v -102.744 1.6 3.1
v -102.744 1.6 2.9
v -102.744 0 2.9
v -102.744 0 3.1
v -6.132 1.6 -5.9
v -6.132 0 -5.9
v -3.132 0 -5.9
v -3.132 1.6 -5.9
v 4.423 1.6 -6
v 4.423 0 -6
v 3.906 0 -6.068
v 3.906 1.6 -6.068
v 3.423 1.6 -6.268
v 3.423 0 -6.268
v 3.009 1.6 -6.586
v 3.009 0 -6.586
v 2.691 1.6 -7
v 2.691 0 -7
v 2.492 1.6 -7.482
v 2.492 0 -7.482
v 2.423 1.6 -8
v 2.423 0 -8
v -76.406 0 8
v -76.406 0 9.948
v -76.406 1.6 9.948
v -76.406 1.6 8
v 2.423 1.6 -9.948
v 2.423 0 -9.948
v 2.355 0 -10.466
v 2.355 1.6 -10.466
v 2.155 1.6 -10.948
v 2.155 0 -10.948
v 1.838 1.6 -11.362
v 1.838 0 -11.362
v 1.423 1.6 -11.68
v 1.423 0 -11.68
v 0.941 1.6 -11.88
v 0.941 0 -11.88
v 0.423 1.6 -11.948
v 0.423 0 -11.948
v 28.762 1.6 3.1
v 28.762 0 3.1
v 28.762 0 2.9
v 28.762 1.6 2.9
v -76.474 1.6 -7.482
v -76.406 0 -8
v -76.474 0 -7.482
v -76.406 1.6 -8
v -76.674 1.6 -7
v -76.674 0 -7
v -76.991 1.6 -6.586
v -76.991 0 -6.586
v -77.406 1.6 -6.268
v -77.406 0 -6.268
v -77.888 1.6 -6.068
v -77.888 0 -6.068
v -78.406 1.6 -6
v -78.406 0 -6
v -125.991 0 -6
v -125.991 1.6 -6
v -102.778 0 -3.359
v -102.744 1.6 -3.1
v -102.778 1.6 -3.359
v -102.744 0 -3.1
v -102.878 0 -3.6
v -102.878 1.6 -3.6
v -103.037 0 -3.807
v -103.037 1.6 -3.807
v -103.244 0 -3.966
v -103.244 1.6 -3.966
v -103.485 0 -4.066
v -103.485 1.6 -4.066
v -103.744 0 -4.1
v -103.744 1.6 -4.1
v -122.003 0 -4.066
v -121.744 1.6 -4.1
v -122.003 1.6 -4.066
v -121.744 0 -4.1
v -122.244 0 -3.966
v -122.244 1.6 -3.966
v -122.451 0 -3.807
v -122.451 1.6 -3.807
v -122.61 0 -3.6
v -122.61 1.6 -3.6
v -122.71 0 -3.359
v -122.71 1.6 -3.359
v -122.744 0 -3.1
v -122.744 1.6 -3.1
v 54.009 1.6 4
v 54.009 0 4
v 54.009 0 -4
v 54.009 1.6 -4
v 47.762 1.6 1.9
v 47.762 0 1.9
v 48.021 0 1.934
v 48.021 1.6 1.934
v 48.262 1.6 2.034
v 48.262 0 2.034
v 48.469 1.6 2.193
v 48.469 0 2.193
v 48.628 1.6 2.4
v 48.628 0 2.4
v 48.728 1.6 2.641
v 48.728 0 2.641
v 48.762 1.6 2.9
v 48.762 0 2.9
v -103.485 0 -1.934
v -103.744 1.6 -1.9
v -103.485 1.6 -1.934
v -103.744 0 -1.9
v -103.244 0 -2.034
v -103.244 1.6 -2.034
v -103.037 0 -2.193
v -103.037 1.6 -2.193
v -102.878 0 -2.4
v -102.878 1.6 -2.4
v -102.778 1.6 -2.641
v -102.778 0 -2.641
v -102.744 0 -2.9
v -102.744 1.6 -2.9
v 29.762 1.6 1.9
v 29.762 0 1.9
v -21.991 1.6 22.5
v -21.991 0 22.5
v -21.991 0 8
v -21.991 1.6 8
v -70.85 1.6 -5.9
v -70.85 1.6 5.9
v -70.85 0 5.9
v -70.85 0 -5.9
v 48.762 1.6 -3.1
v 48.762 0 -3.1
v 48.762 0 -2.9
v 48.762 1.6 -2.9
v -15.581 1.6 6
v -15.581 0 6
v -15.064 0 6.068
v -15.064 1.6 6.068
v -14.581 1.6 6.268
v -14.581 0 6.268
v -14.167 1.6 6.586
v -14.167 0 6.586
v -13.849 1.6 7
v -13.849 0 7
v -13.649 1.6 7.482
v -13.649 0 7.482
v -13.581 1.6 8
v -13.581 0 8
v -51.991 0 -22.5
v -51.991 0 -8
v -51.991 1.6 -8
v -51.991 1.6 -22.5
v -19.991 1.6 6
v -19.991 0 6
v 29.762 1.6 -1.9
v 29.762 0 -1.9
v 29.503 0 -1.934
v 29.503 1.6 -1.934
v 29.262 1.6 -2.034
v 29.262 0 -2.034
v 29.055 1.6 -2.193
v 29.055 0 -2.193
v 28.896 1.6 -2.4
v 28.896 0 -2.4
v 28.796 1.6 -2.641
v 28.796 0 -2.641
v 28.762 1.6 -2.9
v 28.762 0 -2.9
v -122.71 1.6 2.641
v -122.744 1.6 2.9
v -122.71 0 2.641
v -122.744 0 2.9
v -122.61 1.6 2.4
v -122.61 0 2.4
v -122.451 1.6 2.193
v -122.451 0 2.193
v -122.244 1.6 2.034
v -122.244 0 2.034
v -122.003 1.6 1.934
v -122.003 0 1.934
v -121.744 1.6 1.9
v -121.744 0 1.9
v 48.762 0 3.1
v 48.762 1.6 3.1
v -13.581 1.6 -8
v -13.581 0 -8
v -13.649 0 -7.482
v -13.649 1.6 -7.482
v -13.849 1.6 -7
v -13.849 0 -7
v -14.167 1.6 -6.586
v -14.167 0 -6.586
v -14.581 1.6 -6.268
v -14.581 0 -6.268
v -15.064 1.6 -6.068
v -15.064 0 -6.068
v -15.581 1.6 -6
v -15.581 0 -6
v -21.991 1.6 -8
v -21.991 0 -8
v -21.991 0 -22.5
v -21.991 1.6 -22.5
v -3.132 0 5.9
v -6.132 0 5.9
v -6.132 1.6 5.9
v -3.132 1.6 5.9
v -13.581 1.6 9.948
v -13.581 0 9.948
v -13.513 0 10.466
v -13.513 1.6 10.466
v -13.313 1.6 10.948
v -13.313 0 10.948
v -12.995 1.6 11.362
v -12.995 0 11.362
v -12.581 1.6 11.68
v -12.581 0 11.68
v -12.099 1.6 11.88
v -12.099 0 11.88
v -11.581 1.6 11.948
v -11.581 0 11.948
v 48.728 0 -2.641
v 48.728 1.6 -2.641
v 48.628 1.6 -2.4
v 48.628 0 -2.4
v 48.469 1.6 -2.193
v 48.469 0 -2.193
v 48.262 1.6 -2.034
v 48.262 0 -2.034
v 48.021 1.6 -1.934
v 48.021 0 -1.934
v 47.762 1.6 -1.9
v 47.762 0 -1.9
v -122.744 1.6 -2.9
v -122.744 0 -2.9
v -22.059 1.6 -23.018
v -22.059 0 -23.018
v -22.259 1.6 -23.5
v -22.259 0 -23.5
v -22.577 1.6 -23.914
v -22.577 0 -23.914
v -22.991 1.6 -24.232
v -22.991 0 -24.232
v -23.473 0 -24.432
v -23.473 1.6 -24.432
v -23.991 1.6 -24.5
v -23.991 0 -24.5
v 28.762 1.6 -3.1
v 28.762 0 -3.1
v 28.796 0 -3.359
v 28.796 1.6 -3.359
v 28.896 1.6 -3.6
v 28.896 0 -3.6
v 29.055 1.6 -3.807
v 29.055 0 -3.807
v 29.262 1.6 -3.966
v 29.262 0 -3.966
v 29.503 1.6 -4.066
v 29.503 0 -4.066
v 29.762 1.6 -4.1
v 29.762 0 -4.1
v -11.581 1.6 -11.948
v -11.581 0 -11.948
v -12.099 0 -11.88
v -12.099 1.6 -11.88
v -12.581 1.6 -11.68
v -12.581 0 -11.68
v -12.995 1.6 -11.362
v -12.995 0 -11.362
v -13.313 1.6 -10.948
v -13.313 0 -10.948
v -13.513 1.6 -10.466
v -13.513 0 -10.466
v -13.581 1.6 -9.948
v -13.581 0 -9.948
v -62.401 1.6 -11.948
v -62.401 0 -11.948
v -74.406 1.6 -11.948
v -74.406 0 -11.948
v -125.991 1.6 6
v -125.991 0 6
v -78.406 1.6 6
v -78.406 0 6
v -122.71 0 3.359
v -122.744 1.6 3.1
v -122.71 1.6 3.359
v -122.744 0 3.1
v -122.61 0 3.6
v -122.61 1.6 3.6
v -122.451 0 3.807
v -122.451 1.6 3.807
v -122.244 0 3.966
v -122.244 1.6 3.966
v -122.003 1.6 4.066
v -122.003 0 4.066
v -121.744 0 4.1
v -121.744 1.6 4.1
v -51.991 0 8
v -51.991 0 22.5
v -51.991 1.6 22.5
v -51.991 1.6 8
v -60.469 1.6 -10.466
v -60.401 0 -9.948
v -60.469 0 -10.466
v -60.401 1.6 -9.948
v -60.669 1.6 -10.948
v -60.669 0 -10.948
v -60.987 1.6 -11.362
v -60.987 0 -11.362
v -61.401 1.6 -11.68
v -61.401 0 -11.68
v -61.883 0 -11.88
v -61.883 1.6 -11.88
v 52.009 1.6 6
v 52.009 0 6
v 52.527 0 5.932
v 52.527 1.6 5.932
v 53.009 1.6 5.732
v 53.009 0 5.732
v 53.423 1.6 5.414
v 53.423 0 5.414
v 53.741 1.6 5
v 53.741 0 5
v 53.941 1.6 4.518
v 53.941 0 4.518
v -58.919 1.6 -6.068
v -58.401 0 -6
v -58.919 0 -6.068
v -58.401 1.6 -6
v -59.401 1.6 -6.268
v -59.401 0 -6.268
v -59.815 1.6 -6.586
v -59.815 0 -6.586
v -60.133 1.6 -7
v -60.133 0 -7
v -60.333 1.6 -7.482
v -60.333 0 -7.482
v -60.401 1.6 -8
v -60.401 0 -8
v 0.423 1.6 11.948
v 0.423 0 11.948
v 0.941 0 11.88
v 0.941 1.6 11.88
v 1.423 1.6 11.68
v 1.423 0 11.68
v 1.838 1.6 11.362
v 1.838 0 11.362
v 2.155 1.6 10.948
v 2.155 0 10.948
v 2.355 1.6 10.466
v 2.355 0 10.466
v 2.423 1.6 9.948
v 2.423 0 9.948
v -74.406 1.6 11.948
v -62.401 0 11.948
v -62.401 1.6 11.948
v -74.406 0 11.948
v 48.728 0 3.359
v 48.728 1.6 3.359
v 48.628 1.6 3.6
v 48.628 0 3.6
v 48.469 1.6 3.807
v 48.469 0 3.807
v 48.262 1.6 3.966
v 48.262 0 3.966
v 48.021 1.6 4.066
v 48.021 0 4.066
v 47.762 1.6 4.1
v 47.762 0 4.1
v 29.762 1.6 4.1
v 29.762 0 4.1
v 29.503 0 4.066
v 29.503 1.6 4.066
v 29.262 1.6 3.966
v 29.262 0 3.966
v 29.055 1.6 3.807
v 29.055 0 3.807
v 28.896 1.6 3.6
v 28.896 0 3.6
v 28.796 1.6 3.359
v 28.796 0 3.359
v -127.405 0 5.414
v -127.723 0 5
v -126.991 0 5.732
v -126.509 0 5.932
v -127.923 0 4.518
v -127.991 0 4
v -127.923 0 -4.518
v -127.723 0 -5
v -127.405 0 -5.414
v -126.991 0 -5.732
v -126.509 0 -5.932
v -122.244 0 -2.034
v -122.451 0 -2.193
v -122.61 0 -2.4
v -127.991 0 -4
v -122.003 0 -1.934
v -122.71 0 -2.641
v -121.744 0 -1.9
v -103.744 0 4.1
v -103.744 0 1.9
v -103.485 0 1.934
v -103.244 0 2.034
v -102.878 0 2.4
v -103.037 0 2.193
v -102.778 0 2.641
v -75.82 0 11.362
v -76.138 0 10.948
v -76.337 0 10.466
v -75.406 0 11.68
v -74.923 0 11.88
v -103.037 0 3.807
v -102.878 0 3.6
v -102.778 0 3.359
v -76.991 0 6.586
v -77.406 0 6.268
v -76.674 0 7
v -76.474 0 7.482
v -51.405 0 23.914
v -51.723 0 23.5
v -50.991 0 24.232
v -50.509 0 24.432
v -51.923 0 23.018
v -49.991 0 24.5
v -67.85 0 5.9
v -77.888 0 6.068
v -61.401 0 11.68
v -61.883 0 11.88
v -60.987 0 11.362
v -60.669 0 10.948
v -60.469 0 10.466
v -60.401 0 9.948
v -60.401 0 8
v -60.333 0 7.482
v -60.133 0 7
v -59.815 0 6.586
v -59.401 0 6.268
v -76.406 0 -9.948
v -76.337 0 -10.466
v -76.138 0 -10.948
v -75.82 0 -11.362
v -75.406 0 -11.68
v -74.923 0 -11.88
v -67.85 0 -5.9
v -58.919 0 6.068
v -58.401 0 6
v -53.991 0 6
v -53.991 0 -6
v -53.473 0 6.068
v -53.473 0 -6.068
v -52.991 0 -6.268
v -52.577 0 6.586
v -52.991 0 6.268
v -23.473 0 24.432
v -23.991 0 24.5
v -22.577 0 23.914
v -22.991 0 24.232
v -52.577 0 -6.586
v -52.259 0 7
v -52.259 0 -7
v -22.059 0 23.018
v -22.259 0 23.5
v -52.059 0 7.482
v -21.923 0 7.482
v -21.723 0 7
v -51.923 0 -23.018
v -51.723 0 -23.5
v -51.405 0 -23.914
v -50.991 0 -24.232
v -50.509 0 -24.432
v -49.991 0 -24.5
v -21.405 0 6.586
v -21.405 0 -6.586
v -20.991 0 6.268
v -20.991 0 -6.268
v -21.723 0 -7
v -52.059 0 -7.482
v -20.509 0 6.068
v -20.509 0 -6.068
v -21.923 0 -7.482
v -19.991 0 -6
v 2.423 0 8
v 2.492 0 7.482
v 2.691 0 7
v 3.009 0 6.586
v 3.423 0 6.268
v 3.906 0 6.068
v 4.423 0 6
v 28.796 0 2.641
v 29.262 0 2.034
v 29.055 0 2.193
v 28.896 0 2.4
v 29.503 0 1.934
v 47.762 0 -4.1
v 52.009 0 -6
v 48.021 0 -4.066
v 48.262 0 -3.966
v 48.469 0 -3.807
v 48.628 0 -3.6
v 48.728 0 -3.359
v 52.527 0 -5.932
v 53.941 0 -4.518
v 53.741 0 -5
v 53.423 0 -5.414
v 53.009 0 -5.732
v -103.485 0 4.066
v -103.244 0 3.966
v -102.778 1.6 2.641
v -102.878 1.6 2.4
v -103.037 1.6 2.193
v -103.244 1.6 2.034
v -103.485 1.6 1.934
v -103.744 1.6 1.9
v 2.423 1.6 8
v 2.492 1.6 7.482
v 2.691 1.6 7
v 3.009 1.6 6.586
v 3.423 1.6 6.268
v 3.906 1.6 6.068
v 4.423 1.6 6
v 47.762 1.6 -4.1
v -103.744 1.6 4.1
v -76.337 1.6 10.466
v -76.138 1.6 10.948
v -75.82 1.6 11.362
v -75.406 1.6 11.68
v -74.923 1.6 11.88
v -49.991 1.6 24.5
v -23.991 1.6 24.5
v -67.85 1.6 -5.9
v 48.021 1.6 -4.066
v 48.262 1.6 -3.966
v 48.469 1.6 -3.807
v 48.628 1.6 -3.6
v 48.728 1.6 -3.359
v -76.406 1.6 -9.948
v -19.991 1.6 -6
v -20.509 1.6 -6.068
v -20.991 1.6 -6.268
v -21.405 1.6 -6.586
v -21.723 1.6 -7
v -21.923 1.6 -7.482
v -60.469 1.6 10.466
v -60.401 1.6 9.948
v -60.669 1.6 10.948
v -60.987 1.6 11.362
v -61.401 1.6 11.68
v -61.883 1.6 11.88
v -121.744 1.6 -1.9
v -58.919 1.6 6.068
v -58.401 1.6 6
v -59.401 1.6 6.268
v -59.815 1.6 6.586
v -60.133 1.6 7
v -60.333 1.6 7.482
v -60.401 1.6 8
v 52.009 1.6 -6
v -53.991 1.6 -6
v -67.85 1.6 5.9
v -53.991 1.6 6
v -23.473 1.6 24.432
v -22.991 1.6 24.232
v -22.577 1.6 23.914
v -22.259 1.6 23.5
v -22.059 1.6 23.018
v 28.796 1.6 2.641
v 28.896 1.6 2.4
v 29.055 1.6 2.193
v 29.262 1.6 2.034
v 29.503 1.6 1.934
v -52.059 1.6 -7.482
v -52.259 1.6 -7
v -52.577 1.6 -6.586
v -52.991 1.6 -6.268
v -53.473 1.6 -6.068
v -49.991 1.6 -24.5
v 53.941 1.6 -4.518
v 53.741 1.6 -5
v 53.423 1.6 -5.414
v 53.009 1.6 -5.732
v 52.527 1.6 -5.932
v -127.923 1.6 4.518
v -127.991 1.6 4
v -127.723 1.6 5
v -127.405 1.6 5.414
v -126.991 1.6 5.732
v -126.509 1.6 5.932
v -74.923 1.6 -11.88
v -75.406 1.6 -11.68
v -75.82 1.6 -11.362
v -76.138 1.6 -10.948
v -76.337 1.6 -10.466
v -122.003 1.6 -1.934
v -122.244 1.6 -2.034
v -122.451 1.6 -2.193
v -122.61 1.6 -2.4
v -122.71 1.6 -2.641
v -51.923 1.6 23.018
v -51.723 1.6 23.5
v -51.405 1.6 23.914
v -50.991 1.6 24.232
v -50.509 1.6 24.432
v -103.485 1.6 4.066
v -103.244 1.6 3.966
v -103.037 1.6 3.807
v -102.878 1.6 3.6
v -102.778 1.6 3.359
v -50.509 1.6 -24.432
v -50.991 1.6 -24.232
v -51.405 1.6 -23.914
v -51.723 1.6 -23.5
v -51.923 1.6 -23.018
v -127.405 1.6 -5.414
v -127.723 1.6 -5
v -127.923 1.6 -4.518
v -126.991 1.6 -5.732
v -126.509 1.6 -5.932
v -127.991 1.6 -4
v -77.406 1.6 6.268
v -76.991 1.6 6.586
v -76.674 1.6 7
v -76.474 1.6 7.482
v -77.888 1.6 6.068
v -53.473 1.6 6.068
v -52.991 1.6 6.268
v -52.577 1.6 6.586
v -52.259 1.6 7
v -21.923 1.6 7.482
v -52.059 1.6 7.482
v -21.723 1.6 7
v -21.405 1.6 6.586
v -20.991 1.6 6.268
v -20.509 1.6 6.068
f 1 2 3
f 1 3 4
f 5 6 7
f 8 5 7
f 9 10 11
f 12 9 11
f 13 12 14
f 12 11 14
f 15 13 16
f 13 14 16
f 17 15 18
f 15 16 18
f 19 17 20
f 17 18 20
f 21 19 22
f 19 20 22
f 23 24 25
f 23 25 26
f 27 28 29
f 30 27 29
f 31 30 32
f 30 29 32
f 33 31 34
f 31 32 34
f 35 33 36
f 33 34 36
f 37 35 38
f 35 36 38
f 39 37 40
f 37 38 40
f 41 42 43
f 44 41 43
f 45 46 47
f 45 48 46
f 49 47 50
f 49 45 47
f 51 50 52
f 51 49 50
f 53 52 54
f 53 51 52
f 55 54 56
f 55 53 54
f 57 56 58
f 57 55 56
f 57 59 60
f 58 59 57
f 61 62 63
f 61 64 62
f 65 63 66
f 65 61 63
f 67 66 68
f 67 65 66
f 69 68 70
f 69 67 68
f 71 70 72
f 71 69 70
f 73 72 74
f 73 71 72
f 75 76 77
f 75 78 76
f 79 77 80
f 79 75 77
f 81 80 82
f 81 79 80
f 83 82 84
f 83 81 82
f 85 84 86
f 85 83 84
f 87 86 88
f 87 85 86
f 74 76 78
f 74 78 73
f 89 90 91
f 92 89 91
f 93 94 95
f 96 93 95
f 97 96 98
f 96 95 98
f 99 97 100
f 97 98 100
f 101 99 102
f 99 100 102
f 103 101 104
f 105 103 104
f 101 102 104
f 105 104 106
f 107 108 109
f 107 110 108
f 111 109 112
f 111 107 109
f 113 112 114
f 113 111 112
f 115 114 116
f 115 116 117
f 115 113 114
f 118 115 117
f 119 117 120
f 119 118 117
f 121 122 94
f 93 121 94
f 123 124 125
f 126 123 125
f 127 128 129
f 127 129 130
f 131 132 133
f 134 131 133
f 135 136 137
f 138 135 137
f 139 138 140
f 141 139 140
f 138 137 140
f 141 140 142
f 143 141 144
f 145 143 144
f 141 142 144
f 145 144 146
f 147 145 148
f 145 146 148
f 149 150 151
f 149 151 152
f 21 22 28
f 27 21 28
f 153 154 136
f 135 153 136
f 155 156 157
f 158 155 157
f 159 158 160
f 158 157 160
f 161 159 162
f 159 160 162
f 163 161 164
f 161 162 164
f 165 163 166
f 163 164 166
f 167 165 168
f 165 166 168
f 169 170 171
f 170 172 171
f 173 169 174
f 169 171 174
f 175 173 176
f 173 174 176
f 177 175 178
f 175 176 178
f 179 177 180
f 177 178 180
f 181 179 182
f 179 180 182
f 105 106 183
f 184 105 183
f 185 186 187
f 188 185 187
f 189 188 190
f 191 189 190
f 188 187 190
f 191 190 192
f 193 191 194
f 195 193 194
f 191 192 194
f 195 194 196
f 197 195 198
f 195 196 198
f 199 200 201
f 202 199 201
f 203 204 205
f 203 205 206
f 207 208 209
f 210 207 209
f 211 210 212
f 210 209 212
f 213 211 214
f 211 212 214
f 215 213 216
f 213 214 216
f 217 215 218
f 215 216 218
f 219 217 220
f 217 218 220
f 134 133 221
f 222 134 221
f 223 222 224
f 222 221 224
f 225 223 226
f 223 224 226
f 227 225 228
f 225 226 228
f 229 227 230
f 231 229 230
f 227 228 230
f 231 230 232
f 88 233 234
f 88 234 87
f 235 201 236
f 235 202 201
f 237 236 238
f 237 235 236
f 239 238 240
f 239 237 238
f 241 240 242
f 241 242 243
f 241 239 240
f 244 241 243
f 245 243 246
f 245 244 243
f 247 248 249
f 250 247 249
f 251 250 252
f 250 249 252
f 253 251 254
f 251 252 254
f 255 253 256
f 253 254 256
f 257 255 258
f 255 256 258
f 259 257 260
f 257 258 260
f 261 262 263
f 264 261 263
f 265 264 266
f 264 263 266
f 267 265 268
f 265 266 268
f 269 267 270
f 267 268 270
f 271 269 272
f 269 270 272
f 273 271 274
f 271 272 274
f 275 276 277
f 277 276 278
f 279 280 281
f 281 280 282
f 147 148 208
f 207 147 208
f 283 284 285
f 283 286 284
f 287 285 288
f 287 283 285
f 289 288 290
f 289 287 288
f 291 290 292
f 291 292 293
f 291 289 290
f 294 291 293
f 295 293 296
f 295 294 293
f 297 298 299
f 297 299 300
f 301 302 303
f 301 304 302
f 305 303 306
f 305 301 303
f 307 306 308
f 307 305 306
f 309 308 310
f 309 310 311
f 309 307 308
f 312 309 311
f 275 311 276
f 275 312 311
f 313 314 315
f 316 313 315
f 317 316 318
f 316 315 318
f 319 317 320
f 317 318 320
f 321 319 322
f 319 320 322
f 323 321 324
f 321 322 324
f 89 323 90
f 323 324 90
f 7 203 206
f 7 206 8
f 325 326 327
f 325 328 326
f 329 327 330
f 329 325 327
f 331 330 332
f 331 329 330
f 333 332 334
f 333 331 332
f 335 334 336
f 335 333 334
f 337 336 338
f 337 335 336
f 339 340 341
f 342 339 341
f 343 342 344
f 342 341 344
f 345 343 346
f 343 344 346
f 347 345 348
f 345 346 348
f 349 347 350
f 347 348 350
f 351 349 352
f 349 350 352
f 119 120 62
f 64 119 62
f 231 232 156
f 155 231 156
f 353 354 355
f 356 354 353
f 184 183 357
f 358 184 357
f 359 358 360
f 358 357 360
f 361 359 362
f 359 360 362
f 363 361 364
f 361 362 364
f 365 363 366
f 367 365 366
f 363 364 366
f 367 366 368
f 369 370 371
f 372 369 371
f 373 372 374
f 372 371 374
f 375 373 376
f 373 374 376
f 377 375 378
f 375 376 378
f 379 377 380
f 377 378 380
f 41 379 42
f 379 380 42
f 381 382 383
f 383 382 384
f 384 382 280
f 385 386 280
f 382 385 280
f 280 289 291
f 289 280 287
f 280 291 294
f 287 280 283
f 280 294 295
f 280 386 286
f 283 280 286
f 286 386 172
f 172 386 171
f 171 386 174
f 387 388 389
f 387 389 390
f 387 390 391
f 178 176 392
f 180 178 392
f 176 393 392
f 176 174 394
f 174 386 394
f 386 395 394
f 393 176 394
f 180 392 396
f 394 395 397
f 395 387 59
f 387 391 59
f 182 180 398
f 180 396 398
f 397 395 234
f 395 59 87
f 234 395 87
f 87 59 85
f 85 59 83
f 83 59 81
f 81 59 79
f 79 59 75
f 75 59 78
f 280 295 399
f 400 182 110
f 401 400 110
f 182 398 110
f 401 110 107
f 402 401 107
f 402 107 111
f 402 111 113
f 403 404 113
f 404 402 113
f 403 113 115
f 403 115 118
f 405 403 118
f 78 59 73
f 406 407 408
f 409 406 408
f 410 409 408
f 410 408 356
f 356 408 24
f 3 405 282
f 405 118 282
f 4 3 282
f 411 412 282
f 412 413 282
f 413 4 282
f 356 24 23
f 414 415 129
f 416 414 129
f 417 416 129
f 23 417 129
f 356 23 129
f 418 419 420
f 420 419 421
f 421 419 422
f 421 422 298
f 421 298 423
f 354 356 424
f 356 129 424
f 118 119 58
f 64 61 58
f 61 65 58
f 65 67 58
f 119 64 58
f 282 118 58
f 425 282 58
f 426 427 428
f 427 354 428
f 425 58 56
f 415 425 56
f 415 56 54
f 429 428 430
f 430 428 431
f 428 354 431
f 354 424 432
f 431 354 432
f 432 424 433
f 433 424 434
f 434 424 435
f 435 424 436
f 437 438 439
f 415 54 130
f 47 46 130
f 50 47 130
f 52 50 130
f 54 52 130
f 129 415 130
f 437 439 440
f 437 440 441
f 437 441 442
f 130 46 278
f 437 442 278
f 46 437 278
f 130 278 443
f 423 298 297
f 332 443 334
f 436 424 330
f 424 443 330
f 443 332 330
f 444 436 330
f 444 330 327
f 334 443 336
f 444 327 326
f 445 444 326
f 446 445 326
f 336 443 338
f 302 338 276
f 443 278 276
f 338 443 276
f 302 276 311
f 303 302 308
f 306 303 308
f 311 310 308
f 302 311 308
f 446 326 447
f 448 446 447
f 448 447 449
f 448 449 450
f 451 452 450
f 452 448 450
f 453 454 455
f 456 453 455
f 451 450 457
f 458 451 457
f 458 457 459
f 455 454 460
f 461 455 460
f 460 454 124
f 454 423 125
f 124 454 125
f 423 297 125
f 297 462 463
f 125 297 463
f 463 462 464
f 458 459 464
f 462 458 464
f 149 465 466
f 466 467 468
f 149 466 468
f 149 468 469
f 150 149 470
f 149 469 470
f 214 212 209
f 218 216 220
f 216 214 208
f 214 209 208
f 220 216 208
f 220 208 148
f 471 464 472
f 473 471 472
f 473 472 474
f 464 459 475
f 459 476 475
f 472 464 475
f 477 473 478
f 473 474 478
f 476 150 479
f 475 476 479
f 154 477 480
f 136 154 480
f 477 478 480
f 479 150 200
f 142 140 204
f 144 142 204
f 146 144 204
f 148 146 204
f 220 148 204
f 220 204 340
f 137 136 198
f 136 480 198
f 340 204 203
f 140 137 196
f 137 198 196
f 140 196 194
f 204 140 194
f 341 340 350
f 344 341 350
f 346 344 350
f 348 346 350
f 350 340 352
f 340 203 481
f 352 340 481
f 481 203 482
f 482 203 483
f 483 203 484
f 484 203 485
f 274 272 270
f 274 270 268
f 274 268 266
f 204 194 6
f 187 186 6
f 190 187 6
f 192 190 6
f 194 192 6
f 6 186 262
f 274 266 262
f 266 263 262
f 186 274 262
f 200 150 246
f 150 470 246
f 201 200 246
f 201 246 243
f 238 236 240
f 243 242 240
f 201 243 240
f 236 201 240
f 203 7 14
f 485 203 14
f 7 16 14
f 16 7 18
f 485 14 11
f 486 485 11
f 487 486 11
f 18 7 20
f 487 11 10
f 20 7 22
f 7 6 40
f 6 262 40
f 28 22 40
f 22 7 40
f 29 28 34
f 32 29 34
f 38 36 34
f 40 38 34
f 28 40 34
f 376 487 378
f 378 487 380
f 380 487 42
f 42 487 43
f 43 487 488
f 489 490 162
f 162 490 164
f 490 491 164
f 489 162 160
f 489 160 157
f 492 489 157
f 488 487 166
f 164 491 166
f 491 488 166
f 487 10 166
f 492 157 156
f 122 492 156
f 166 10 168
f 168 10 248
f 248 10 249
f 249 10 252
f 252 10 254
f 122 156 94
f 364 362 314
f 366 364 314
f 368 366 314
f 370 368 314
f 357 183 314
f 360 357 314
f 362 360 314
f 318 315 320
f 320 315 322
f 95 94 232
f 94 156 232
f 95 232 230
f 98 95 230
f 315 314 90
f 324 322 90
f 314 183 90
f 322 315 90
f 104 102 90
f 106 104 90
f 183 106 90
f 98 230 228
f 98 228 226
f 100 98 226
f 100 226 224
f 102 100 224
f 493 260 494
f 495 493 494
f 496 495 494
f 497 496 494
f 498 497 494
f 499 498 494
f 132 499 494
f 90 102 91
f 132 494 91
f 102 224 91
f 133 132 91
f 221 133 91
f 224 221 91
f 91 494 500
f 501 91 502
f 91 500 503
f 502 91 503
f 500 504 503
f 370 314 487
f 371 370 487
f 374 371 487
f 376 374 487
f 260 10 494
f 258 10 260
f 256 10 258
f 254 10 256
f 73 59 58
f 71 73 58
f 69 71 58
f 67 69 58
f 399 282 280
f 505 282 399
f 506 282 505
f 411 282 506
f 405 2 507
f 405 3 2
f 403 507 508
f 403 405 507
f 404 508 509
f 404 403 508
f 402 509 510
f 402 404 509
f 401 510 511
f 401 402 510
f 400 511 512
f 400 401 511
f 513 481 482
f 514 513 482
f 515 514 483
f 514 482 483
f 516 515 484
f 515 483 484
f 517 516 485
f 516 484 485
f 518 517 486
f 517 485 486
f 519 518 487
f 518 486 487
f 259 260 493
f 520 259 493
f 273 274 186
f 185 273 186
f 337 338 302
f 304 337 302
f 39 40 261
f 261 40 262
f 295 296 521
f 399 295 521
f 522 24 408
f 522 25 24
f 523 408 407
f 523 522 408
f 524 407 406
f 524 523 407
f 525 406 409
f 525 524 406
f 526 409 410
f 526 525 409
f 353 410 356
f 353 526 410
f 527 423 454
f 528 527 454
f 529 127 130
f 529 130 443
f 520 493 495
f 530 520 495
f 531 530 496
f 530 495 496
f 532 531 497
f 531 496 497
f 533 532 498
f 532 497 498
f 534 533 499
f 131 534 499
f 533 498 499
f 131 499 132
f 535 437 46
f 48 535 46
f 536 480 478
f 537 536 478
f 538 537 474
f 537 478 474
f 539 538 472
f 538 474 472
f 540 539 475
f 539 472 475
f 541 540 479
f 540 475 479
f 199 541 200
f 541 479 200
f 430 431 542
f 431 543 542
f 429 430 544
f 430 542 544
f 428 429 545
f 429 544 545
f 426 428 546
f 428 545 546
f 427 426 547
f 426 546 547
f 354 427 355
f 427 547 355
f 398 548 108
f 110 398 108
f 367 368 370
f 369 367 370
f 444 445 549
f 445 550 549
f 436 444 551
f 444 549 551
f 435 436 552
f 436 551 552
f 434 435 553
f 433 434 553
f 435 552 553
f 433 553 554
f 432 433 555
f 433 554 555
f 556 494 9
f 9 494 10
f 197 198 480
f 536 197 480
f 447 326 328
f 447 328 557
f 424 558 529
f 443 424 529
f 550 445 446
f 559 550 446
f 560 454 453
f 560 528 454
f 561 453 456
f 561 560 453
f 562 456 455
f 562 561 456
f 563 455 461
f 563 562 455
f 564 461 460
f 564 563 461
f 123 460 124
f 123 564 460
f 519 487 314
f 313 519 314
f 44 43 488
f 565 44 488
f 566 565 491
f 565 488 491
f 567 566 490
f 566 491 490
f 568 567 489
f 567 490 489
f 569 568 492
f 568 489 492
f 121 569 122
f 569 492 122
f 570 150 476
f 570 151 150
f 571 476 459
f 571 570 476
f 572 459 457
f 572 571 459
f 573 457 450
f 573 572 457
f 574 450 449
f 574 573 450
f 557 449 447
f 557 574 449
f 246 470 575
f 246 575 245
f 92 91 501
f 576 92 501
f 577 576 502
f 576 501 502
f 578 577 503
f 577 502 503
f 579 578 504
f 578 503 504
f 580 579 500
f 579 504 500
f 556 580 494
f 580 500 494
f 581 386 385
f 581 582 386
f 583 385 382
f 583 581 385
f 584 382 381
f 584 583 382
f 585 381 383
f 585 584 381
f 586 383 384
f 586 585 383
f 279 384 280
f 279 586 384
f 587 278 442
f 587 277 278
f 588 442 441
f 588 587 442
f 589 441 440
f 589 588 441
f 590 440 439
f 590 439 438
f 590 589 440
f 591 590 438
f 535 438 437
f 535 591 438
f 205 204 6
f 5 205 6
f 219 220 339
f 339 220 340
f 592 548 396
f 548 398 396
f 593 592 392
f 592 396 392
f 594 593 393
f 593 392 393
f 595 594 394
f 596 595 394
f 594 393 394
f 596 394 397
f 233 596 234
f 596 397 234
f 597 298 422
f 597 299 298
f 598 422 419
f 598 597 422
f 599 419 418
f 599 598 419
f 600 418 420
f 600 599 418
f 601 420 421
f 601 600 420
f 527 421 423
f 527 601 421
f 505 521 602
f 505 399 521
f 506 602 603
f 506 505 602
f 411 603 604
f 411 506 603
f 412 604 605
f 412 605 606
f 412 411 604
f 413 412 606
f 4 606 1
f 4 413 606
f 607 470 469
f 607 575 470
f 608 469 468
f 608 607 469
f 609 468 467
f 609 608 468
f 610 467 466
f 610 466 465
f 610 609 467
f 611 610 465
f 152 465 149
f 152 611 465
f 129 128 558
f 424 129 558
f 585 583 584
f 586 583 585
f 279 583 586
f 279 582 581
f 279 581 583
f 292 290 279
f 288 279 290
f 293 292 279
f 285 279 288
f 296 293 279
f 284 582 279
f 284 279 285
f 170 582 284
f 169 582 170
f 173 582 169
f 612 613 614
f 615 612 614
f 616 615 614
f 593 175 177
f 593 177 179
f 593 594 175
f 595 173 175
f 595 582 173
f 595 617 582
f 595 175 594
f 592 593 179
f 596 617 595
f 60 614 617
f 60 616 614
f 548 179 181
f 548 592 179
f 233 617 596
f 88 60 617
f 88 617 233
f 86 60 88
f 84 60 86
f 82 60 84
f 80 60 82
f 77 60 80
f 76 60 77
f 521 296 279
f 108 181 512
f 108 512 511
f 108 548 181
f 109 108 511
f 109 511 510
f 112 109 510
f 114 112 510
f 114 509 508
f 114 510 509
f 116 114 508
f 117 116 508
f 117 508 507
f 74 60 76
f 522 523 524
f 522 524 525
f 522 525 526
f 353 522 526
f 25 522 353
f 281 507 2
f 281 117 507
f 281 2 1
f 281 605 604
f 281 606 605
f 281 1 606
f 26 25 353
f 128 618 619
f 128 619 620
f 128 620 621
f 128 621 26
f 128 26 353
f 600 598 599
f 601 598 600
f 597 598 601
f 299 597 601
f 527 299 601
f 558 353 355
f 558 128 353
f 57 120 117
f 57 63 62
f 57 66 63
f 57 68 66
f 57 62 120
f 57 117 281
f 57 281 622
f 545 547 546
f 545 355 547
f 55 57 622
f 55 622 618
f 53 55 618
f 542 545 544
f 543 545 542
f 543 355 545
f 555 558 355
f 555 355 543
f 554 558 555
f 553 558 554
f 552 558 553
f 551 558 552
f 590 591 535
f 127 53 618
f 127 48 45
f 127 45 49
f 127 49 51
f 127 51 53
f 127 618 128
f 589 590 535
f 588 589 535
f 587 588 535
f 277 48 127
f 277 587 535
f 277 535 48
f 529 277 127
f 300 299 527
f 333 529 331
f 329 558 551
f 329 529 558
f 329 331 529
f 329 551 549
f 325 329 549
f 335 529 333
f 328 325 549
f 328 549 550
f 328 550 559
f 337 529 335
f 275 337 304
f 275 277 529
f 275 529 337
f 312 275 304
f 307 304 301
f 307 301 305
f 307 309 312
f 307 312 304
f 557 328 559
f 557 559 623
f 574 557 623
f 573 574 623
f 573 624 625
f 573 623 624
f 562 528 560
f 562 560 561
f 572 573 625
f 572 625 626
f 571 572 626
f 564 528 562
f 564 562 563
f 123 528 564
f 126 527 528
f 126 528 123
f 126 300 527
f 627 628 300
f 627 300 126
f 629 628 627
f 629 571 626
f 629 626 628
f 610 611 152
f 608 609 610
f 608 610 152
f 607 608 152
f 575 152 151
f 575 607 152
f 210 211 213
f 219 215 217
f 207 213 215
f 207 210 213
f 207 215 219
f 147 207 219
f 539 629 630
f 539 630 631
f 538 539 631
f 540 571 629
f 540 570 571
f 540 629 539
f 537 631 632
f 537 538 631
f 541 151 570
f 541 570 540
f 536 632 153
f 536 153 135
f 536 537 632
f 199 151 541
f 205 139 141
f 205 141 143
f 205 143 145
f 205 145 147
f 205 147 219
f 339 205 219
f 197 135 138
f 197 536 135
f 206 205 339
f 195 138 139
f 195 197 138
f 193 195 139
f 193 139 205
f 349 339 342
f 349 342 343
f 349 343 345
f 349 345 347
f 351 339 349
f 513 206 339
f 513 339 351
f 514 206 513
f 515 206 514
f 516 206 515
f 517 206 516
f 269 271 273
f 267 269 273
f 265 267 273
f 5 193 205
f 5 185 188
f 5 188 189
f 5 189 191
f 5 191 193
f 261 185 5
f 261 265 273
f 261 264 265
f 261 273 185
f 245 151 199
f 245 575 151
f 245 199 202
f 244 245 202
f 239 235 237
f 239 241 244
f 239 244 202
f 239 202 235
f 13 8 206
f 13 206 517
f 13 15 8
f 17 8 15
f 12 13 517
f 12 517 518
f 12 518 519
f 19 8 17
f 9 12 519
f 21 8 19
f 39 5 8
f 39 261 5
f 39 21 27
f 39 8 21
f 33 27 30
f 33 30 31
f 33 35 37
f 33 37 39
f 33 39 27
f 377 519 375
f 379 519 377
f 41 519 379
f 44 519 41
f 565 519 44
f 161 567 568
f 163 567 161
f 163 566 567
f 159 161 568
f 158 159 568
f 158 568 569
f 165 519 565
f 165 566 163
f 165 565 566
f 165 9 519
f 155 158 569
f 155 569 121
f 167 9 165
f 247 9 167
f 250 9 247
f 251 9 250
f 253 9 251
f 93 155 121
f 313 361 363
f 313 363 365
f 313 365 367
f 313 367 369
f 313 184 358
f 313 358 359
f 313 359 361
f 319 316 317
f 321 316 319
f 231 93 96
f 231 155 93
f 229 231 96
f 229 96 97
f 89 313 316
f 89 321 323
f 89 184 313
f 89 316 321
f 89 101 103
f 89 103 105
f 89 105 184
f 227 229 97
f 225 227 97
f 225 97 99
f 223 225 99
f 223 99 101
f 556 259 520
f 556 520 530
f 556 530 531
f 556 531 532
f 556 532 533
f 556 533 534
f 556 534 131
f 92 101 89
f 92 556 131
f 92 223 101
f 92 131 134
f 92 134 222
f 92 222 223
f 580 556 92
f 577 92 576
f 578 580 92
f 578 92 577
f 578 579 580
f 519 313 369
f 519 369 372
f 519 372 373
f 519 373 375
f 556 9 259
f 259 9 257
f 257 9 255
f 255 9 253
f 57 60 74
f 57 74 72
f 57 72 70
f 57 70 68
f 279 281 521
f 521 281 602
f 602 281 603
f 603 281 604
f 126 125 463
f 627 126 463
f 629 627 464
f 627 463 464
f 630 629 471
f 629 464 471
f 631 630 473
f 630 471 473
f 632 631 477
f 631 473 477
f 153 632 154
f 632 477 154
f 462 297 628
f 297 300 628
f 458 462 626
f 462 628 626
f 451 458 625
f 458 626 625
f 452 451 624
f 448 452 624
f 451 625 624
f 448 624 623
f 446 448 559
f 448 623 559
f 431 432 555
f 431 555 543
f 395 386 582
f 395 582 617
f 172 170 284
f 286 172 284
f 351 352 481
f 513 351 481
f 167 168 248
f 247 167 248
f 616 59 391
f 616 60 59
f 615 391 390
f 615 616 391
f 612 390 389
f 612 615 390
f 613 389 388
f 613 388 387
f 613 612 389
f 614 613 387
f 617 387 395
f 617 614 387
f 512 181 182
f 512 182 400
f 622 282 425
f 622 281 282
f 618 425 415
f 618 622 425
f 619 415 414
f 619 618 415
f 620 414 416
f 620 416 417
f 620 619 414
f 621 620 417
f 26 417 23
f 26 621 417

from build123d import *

# Parameters (mm, degrees)
SKETCH_11_W             = 70
SKETCH_11_H             = 12
EXTRUDE_6_DEPTH         = 1.6
SKETCH_12_W             = 3
SKETCH_12_H             = 11.8
CUT_EXTRUDE_6_DEPTH     = 1.6
SKETCH_13_W             = 20
SKETCH_13_H             = 2.2
CUT_EXTRUDE_7_DEPTH     = 1.6
FILLET_1_R              = 1
FILLET_1_OF_MIRROR_15_R = 1
EXTRUDE_7_DEPTH         = 1.6
SKETCH_16_W             = 6
SKETCH_16_H             = 12
EXTRUDE_9_DEPTH         = 1.6
SKETCH_18_W             = 30
SKETCH_18_H             = 49
EXTRUDE_12_DEPTH        = 1.6
FILLET_3_R              = 2
MIRROR_24_OUTLINE_W     = 3
MIRROR_24_OUTLINE_H     = 11.8
MIRROR_24_DEPTH         = 1.6
FILLET_4_R              = 2


# Read off the part's stored shape, not the designer's step: 镜向24
with BuildPart() as part:
    # 草图11 → 凸台-拉伸6 (new body)
    with BuildSketch(Plane(origin=(0, 0, 0), x_dir=(1, 0, 0), z_dir=(0, 1, 0))):
        with Locations((-92.991102456, 0)):
            Rectangle(SKETCH_11_W, SKETCH_11_H)
    extrude(amount=EXTRUDE_6_DEPTH)

    # 草图12 → 切除-拉伸6 (cut)
    with BuildSketch(Plane(origin=(0, 1.6, 0), x_dir=(1, 0, 0), z_dir=(0, 1, 0))):
        with Locations((-69.350034459, 0)):
            Rectangle(SKETCH_12_W, SKETCH_12_H)
    extrude(amount=-CUT_EXTRUDE_6_DEPTH, mode=Mode.SUBTRACT)

    # 草图13 → 切除-拉伸7 (cut)
    with BuildSketch(Plane(origin=(0, 1.6, 0), x_dir=(1, 0, 0), z_dir=(0, 1, 0))):
        with Locations((-112.744310304, 3)):
            Rectangle(SKETCH_13_W, SKETCH_13_H)
    cut_extrude_7 = extrude(amount=-CUT_EXTRUDE_7_DEPTH, mode=Mode.SUBTRACT)

    # 圆角1
    fillet_1_edges = [part.edges().sort_by_distance(p)[0] for p in [
        (-122.744310304, 0.8, -1.9),
        (-122.744310304, 0.8, -4.1),
        (-102.744310304, 0.8, -4.1),
        (-102.744310304, 0.8, -1.9),
    ]]
    fillet(fillet_1_edges, radius=FILLET_1_R)

    # 镜向15: 切除-拉伸7 across plane
    add(cut_extrude_7.mirror(Plane(origin=(0, 0, 0), x_dir=(1, 0, 0), z_dir=(0, 0, -1))), mode=Mode.SUBTRACT)

    # 圆角1 of 镜向15
    fillet_1_of_mirror_15_edges = [part.edges().sort_by_distance(p)[0] for p in [
        (-122.744310304, 0.8, 1.9),
        (-122.744310304, 0.8, 4.1),
        (-102.744310304, 0.8, 4.1),
        (-102.744310304, 0.8, 1.9),
    ]]
    fillet(fillet_1_of_mirror_15_edges, radius=FILLET_1_OF_MIRROR_15_R)

    # 草图14 → 凸台-拉伸7 (add)
    with BuildSketch(Plane(origin=(0, 0, 0), x_dir=(1, 0, 0), z_dir=(0, 1, 0))):
        Polygon((-60.400975616, 6), (-60.400975616, 11.948069584), (-62.610711949, 11.948069584), (-76.405563985, 11.948069584), (-76.405563985, 6), (-74.195827651, 6), (-62.609356584, 6), align=None)
    extrude_7 = extrude(amount=EXTRUDE_7_DEPTH)

    # 镜向17: 凸台-拉伸7 across plane
    add(extrude_7.mirror(Plane(origin=(0, 0, 0), x_dir=(1, 0, 0), z_dir=(0, 0, -1))))

    # 草图16 → 凸台-拉伸9 (add)
    with BuildSketch(Plane(origin=(0, 0, 0), x_dir=(1, 0, 0), z_dir=(0, 1, 0))):
        with Locations((-54.991102456, 0)):
            Rectangle(SKETCH_16_W, SKETCH_16_H)
    extrude(amount=EXTRUDE_9_DEPTH)

    # 草图18 → 凸台-拉伸12 (add)
    with BuildSketch(Plane(origin=(0, 0, 0), x_dir=(1, 0, 0), z_dir=(0, 1, 0))):
        with Locations((-36.991102456, 0)):
            Rectangle(SKETCH_18_W, SKETCH_18_H)
    extrude(amount=EXTRUDE_12_DEPTH)

    # 圆角3
    fillet_3_edges = [part.edges().sort_by_distance(p)[0] for p in [
        (-127.991102456, 0.8, 6),
        (-127.991102456, 0.8, -6),
        (-51.991102456, 0.8, -6),
        (-51.991102456, 0.8, 6),
        (-76.405563985, 0.8, 6),
        (-60.400975616, 0.8, 6),
        (-60.400975616, 0.8, -6),
        (-76.405563985, 0.8, -6),
        (-60.400975616, 0.8, 11.948069584),
        (-76.405563985, 0.8, 11.948069584),
        (-76.405563985, 0.8, -11.948069584),
        (-60.400975616, 0.8, -11.948069584),
    ]]
    fillet(fillet_3_edges, radius=FILLET_3_R)

    # 镜向24 outline → 镜向24 (add)
    with BuildSketch(Plane(origin=(0, 0, 0), x_dir=(1, 0, 0), z_dir=(0, 1, 0))):
        with BuildLine():
            Line((4.423359072, -6), (52.008897544, -6))
            ThreePointArc((52.008897544, -6), (53.423111106, -5.414213562), (54.008897544, -4))
            Line((54.008897544, -4), (54.008897544, 4))
            ThreePointArc((54.008897544, 4), (53.423111106, 5.414213562), (52.008897544, 6))
            Line((52.008897544, 6), (4.423359072, 6))
            ThreePointArc((4.423359072, 6), (3.00914551, 6.585786438), (2.423359072, 8))
            Line((2.423359072, 8), (2.423359072, 9.948069584))
            ThreePointArc((2.423359072, 9.948069584), (1.837572634, 11.362283146), (0.423359072, 11.948069584))
            Line((0.423359072, 11.948069584), (-11.581229297, 11.948069584))
            ThreePointArc((-11.581229297, 11.948069584), (-12.995442859, 11.362283146), (-13.581229297, 9.948069584))
            Line((-13.581229297, 9.948069584), (-13.581229297, 8))
            ThreePointArc((-13.581229297, 8), (-14.167015735, 6.585786438), (-15.581229297, 6))
            Line((-15.581229297, 6), (-19.991102456, 6))
            ThreePointArc((-19.991102456, 6), (-21.405316019, 6.585786437), (-21.991102456, 8))
            Line((-21.991102456, 8), (-21.991102456, -8))
            ThreePointArc((-21.991102456, -8), (-21.405316019, -6.585786437), (-19.991102456, -6))
            Line((-19.991102456, -6), (-15.581229297, -6))
            ThreePointArc((-15.581229297, -6), (-14.167015735, -6.585786438), (-13.581229297, -8))
            Line((-13.581229297, -8), (-13.581229297, -9.948069584))
            ThreePointArc((-13.581229297, -9.948069584), (-12.995442859, -11.362283146), (-11.581229297, -11.948069584))
            Line((-11.581229297, -11.948069584), (0.423359072, -11.948069584))
            ThreePointArc((0.423359072, -11.948069584), (1.837572634, -11.362283146), (2.423359072, -9.948069584))
            Line((2.423359072, -9.948069584), (2.423359072, -8))
            ThreePointArc((2.423359072, -8), (3.00914551, -6.585786438), (4.423359072, -6))
        make_face()
        with Locations((-4.632170453, 0)):
            Rectangle(MIRROR_24_OUTLINE_W, MIRROR_24_OUTLINE_H, mode=Mode.SUBTRACT)
        with BuildLine():
            ThreePointArc((28.762105391, -2.9), (29.05499861, -2.192893219), (29.762105391, -1.9))
            Line((29.762105391, -1.9), (47.762105391, -1.9))
            ThreePointArc((47.762105391, -1.9), (48.469212172, -2.192893219), (48.762105391, -2.9))
            Line((48.762105391, -2.9), (48.762105391, -3.1))
            ThreePointArc((48.762105391, -3.1), (48.469212172, -3.807106781), (47.762105391, -4.1))
            Line((47.762105391, -4.1), (29.762105391, -4.1))
            ThreePointArc((29.762105391, -4.1), (29.05499861, -3.807106781), (28.762105391, -3.1))
            Line((28.762105391, -3.1), (28.762105391, -2.9))
        make_face(mode=Mode.SUBTRACT)
        with BuildLine():
            Line((29.762105391, 4.1), (47.762105391, 4.1))
            ThreePointArc((47.762105391, 4.1), (48.469212172, 3.807106781), (48.762105391, 3.1))
            Line((48.762105391, 3.1), (48.762105391, 2.9))
            ThreePointArc((48.762105391, 2.9), (48.469212172, 2.192893219), (47.762105391, 1.9))
            Line((47.762105391, 1.9), (29.762105391, 1.9))
            ThreePointArc((29.762105391, 1.9), (29.05499861, 2.192893219), (28.762105391, 2.9))
            Line((28.762105391, 2.9), (28.762105391, 3.1))
            ThreePointArc((28.762105391, 3.1), (29.05499861, 3.807106781), (29.762105391, 4.1))
        make_face(mode=Mode.SUBTRACT)
    extrude(amount=MIRROR_24_DEPTH)

    # 圆角4
    fillet_4_edges = [part.edges().sort_by_distance(p)[0] for p in [
        (-21.991102456, 0.8, -24.5),
        (-51.991102456, 0.8, -24.5),
        (-51.991102456, 0.8, 24.5),
        (-21.991102456, 0.8, 24.5),
    ]]
    fillet(fillet_4_edges, radius=FILLET_4_R)


solid = part.part
